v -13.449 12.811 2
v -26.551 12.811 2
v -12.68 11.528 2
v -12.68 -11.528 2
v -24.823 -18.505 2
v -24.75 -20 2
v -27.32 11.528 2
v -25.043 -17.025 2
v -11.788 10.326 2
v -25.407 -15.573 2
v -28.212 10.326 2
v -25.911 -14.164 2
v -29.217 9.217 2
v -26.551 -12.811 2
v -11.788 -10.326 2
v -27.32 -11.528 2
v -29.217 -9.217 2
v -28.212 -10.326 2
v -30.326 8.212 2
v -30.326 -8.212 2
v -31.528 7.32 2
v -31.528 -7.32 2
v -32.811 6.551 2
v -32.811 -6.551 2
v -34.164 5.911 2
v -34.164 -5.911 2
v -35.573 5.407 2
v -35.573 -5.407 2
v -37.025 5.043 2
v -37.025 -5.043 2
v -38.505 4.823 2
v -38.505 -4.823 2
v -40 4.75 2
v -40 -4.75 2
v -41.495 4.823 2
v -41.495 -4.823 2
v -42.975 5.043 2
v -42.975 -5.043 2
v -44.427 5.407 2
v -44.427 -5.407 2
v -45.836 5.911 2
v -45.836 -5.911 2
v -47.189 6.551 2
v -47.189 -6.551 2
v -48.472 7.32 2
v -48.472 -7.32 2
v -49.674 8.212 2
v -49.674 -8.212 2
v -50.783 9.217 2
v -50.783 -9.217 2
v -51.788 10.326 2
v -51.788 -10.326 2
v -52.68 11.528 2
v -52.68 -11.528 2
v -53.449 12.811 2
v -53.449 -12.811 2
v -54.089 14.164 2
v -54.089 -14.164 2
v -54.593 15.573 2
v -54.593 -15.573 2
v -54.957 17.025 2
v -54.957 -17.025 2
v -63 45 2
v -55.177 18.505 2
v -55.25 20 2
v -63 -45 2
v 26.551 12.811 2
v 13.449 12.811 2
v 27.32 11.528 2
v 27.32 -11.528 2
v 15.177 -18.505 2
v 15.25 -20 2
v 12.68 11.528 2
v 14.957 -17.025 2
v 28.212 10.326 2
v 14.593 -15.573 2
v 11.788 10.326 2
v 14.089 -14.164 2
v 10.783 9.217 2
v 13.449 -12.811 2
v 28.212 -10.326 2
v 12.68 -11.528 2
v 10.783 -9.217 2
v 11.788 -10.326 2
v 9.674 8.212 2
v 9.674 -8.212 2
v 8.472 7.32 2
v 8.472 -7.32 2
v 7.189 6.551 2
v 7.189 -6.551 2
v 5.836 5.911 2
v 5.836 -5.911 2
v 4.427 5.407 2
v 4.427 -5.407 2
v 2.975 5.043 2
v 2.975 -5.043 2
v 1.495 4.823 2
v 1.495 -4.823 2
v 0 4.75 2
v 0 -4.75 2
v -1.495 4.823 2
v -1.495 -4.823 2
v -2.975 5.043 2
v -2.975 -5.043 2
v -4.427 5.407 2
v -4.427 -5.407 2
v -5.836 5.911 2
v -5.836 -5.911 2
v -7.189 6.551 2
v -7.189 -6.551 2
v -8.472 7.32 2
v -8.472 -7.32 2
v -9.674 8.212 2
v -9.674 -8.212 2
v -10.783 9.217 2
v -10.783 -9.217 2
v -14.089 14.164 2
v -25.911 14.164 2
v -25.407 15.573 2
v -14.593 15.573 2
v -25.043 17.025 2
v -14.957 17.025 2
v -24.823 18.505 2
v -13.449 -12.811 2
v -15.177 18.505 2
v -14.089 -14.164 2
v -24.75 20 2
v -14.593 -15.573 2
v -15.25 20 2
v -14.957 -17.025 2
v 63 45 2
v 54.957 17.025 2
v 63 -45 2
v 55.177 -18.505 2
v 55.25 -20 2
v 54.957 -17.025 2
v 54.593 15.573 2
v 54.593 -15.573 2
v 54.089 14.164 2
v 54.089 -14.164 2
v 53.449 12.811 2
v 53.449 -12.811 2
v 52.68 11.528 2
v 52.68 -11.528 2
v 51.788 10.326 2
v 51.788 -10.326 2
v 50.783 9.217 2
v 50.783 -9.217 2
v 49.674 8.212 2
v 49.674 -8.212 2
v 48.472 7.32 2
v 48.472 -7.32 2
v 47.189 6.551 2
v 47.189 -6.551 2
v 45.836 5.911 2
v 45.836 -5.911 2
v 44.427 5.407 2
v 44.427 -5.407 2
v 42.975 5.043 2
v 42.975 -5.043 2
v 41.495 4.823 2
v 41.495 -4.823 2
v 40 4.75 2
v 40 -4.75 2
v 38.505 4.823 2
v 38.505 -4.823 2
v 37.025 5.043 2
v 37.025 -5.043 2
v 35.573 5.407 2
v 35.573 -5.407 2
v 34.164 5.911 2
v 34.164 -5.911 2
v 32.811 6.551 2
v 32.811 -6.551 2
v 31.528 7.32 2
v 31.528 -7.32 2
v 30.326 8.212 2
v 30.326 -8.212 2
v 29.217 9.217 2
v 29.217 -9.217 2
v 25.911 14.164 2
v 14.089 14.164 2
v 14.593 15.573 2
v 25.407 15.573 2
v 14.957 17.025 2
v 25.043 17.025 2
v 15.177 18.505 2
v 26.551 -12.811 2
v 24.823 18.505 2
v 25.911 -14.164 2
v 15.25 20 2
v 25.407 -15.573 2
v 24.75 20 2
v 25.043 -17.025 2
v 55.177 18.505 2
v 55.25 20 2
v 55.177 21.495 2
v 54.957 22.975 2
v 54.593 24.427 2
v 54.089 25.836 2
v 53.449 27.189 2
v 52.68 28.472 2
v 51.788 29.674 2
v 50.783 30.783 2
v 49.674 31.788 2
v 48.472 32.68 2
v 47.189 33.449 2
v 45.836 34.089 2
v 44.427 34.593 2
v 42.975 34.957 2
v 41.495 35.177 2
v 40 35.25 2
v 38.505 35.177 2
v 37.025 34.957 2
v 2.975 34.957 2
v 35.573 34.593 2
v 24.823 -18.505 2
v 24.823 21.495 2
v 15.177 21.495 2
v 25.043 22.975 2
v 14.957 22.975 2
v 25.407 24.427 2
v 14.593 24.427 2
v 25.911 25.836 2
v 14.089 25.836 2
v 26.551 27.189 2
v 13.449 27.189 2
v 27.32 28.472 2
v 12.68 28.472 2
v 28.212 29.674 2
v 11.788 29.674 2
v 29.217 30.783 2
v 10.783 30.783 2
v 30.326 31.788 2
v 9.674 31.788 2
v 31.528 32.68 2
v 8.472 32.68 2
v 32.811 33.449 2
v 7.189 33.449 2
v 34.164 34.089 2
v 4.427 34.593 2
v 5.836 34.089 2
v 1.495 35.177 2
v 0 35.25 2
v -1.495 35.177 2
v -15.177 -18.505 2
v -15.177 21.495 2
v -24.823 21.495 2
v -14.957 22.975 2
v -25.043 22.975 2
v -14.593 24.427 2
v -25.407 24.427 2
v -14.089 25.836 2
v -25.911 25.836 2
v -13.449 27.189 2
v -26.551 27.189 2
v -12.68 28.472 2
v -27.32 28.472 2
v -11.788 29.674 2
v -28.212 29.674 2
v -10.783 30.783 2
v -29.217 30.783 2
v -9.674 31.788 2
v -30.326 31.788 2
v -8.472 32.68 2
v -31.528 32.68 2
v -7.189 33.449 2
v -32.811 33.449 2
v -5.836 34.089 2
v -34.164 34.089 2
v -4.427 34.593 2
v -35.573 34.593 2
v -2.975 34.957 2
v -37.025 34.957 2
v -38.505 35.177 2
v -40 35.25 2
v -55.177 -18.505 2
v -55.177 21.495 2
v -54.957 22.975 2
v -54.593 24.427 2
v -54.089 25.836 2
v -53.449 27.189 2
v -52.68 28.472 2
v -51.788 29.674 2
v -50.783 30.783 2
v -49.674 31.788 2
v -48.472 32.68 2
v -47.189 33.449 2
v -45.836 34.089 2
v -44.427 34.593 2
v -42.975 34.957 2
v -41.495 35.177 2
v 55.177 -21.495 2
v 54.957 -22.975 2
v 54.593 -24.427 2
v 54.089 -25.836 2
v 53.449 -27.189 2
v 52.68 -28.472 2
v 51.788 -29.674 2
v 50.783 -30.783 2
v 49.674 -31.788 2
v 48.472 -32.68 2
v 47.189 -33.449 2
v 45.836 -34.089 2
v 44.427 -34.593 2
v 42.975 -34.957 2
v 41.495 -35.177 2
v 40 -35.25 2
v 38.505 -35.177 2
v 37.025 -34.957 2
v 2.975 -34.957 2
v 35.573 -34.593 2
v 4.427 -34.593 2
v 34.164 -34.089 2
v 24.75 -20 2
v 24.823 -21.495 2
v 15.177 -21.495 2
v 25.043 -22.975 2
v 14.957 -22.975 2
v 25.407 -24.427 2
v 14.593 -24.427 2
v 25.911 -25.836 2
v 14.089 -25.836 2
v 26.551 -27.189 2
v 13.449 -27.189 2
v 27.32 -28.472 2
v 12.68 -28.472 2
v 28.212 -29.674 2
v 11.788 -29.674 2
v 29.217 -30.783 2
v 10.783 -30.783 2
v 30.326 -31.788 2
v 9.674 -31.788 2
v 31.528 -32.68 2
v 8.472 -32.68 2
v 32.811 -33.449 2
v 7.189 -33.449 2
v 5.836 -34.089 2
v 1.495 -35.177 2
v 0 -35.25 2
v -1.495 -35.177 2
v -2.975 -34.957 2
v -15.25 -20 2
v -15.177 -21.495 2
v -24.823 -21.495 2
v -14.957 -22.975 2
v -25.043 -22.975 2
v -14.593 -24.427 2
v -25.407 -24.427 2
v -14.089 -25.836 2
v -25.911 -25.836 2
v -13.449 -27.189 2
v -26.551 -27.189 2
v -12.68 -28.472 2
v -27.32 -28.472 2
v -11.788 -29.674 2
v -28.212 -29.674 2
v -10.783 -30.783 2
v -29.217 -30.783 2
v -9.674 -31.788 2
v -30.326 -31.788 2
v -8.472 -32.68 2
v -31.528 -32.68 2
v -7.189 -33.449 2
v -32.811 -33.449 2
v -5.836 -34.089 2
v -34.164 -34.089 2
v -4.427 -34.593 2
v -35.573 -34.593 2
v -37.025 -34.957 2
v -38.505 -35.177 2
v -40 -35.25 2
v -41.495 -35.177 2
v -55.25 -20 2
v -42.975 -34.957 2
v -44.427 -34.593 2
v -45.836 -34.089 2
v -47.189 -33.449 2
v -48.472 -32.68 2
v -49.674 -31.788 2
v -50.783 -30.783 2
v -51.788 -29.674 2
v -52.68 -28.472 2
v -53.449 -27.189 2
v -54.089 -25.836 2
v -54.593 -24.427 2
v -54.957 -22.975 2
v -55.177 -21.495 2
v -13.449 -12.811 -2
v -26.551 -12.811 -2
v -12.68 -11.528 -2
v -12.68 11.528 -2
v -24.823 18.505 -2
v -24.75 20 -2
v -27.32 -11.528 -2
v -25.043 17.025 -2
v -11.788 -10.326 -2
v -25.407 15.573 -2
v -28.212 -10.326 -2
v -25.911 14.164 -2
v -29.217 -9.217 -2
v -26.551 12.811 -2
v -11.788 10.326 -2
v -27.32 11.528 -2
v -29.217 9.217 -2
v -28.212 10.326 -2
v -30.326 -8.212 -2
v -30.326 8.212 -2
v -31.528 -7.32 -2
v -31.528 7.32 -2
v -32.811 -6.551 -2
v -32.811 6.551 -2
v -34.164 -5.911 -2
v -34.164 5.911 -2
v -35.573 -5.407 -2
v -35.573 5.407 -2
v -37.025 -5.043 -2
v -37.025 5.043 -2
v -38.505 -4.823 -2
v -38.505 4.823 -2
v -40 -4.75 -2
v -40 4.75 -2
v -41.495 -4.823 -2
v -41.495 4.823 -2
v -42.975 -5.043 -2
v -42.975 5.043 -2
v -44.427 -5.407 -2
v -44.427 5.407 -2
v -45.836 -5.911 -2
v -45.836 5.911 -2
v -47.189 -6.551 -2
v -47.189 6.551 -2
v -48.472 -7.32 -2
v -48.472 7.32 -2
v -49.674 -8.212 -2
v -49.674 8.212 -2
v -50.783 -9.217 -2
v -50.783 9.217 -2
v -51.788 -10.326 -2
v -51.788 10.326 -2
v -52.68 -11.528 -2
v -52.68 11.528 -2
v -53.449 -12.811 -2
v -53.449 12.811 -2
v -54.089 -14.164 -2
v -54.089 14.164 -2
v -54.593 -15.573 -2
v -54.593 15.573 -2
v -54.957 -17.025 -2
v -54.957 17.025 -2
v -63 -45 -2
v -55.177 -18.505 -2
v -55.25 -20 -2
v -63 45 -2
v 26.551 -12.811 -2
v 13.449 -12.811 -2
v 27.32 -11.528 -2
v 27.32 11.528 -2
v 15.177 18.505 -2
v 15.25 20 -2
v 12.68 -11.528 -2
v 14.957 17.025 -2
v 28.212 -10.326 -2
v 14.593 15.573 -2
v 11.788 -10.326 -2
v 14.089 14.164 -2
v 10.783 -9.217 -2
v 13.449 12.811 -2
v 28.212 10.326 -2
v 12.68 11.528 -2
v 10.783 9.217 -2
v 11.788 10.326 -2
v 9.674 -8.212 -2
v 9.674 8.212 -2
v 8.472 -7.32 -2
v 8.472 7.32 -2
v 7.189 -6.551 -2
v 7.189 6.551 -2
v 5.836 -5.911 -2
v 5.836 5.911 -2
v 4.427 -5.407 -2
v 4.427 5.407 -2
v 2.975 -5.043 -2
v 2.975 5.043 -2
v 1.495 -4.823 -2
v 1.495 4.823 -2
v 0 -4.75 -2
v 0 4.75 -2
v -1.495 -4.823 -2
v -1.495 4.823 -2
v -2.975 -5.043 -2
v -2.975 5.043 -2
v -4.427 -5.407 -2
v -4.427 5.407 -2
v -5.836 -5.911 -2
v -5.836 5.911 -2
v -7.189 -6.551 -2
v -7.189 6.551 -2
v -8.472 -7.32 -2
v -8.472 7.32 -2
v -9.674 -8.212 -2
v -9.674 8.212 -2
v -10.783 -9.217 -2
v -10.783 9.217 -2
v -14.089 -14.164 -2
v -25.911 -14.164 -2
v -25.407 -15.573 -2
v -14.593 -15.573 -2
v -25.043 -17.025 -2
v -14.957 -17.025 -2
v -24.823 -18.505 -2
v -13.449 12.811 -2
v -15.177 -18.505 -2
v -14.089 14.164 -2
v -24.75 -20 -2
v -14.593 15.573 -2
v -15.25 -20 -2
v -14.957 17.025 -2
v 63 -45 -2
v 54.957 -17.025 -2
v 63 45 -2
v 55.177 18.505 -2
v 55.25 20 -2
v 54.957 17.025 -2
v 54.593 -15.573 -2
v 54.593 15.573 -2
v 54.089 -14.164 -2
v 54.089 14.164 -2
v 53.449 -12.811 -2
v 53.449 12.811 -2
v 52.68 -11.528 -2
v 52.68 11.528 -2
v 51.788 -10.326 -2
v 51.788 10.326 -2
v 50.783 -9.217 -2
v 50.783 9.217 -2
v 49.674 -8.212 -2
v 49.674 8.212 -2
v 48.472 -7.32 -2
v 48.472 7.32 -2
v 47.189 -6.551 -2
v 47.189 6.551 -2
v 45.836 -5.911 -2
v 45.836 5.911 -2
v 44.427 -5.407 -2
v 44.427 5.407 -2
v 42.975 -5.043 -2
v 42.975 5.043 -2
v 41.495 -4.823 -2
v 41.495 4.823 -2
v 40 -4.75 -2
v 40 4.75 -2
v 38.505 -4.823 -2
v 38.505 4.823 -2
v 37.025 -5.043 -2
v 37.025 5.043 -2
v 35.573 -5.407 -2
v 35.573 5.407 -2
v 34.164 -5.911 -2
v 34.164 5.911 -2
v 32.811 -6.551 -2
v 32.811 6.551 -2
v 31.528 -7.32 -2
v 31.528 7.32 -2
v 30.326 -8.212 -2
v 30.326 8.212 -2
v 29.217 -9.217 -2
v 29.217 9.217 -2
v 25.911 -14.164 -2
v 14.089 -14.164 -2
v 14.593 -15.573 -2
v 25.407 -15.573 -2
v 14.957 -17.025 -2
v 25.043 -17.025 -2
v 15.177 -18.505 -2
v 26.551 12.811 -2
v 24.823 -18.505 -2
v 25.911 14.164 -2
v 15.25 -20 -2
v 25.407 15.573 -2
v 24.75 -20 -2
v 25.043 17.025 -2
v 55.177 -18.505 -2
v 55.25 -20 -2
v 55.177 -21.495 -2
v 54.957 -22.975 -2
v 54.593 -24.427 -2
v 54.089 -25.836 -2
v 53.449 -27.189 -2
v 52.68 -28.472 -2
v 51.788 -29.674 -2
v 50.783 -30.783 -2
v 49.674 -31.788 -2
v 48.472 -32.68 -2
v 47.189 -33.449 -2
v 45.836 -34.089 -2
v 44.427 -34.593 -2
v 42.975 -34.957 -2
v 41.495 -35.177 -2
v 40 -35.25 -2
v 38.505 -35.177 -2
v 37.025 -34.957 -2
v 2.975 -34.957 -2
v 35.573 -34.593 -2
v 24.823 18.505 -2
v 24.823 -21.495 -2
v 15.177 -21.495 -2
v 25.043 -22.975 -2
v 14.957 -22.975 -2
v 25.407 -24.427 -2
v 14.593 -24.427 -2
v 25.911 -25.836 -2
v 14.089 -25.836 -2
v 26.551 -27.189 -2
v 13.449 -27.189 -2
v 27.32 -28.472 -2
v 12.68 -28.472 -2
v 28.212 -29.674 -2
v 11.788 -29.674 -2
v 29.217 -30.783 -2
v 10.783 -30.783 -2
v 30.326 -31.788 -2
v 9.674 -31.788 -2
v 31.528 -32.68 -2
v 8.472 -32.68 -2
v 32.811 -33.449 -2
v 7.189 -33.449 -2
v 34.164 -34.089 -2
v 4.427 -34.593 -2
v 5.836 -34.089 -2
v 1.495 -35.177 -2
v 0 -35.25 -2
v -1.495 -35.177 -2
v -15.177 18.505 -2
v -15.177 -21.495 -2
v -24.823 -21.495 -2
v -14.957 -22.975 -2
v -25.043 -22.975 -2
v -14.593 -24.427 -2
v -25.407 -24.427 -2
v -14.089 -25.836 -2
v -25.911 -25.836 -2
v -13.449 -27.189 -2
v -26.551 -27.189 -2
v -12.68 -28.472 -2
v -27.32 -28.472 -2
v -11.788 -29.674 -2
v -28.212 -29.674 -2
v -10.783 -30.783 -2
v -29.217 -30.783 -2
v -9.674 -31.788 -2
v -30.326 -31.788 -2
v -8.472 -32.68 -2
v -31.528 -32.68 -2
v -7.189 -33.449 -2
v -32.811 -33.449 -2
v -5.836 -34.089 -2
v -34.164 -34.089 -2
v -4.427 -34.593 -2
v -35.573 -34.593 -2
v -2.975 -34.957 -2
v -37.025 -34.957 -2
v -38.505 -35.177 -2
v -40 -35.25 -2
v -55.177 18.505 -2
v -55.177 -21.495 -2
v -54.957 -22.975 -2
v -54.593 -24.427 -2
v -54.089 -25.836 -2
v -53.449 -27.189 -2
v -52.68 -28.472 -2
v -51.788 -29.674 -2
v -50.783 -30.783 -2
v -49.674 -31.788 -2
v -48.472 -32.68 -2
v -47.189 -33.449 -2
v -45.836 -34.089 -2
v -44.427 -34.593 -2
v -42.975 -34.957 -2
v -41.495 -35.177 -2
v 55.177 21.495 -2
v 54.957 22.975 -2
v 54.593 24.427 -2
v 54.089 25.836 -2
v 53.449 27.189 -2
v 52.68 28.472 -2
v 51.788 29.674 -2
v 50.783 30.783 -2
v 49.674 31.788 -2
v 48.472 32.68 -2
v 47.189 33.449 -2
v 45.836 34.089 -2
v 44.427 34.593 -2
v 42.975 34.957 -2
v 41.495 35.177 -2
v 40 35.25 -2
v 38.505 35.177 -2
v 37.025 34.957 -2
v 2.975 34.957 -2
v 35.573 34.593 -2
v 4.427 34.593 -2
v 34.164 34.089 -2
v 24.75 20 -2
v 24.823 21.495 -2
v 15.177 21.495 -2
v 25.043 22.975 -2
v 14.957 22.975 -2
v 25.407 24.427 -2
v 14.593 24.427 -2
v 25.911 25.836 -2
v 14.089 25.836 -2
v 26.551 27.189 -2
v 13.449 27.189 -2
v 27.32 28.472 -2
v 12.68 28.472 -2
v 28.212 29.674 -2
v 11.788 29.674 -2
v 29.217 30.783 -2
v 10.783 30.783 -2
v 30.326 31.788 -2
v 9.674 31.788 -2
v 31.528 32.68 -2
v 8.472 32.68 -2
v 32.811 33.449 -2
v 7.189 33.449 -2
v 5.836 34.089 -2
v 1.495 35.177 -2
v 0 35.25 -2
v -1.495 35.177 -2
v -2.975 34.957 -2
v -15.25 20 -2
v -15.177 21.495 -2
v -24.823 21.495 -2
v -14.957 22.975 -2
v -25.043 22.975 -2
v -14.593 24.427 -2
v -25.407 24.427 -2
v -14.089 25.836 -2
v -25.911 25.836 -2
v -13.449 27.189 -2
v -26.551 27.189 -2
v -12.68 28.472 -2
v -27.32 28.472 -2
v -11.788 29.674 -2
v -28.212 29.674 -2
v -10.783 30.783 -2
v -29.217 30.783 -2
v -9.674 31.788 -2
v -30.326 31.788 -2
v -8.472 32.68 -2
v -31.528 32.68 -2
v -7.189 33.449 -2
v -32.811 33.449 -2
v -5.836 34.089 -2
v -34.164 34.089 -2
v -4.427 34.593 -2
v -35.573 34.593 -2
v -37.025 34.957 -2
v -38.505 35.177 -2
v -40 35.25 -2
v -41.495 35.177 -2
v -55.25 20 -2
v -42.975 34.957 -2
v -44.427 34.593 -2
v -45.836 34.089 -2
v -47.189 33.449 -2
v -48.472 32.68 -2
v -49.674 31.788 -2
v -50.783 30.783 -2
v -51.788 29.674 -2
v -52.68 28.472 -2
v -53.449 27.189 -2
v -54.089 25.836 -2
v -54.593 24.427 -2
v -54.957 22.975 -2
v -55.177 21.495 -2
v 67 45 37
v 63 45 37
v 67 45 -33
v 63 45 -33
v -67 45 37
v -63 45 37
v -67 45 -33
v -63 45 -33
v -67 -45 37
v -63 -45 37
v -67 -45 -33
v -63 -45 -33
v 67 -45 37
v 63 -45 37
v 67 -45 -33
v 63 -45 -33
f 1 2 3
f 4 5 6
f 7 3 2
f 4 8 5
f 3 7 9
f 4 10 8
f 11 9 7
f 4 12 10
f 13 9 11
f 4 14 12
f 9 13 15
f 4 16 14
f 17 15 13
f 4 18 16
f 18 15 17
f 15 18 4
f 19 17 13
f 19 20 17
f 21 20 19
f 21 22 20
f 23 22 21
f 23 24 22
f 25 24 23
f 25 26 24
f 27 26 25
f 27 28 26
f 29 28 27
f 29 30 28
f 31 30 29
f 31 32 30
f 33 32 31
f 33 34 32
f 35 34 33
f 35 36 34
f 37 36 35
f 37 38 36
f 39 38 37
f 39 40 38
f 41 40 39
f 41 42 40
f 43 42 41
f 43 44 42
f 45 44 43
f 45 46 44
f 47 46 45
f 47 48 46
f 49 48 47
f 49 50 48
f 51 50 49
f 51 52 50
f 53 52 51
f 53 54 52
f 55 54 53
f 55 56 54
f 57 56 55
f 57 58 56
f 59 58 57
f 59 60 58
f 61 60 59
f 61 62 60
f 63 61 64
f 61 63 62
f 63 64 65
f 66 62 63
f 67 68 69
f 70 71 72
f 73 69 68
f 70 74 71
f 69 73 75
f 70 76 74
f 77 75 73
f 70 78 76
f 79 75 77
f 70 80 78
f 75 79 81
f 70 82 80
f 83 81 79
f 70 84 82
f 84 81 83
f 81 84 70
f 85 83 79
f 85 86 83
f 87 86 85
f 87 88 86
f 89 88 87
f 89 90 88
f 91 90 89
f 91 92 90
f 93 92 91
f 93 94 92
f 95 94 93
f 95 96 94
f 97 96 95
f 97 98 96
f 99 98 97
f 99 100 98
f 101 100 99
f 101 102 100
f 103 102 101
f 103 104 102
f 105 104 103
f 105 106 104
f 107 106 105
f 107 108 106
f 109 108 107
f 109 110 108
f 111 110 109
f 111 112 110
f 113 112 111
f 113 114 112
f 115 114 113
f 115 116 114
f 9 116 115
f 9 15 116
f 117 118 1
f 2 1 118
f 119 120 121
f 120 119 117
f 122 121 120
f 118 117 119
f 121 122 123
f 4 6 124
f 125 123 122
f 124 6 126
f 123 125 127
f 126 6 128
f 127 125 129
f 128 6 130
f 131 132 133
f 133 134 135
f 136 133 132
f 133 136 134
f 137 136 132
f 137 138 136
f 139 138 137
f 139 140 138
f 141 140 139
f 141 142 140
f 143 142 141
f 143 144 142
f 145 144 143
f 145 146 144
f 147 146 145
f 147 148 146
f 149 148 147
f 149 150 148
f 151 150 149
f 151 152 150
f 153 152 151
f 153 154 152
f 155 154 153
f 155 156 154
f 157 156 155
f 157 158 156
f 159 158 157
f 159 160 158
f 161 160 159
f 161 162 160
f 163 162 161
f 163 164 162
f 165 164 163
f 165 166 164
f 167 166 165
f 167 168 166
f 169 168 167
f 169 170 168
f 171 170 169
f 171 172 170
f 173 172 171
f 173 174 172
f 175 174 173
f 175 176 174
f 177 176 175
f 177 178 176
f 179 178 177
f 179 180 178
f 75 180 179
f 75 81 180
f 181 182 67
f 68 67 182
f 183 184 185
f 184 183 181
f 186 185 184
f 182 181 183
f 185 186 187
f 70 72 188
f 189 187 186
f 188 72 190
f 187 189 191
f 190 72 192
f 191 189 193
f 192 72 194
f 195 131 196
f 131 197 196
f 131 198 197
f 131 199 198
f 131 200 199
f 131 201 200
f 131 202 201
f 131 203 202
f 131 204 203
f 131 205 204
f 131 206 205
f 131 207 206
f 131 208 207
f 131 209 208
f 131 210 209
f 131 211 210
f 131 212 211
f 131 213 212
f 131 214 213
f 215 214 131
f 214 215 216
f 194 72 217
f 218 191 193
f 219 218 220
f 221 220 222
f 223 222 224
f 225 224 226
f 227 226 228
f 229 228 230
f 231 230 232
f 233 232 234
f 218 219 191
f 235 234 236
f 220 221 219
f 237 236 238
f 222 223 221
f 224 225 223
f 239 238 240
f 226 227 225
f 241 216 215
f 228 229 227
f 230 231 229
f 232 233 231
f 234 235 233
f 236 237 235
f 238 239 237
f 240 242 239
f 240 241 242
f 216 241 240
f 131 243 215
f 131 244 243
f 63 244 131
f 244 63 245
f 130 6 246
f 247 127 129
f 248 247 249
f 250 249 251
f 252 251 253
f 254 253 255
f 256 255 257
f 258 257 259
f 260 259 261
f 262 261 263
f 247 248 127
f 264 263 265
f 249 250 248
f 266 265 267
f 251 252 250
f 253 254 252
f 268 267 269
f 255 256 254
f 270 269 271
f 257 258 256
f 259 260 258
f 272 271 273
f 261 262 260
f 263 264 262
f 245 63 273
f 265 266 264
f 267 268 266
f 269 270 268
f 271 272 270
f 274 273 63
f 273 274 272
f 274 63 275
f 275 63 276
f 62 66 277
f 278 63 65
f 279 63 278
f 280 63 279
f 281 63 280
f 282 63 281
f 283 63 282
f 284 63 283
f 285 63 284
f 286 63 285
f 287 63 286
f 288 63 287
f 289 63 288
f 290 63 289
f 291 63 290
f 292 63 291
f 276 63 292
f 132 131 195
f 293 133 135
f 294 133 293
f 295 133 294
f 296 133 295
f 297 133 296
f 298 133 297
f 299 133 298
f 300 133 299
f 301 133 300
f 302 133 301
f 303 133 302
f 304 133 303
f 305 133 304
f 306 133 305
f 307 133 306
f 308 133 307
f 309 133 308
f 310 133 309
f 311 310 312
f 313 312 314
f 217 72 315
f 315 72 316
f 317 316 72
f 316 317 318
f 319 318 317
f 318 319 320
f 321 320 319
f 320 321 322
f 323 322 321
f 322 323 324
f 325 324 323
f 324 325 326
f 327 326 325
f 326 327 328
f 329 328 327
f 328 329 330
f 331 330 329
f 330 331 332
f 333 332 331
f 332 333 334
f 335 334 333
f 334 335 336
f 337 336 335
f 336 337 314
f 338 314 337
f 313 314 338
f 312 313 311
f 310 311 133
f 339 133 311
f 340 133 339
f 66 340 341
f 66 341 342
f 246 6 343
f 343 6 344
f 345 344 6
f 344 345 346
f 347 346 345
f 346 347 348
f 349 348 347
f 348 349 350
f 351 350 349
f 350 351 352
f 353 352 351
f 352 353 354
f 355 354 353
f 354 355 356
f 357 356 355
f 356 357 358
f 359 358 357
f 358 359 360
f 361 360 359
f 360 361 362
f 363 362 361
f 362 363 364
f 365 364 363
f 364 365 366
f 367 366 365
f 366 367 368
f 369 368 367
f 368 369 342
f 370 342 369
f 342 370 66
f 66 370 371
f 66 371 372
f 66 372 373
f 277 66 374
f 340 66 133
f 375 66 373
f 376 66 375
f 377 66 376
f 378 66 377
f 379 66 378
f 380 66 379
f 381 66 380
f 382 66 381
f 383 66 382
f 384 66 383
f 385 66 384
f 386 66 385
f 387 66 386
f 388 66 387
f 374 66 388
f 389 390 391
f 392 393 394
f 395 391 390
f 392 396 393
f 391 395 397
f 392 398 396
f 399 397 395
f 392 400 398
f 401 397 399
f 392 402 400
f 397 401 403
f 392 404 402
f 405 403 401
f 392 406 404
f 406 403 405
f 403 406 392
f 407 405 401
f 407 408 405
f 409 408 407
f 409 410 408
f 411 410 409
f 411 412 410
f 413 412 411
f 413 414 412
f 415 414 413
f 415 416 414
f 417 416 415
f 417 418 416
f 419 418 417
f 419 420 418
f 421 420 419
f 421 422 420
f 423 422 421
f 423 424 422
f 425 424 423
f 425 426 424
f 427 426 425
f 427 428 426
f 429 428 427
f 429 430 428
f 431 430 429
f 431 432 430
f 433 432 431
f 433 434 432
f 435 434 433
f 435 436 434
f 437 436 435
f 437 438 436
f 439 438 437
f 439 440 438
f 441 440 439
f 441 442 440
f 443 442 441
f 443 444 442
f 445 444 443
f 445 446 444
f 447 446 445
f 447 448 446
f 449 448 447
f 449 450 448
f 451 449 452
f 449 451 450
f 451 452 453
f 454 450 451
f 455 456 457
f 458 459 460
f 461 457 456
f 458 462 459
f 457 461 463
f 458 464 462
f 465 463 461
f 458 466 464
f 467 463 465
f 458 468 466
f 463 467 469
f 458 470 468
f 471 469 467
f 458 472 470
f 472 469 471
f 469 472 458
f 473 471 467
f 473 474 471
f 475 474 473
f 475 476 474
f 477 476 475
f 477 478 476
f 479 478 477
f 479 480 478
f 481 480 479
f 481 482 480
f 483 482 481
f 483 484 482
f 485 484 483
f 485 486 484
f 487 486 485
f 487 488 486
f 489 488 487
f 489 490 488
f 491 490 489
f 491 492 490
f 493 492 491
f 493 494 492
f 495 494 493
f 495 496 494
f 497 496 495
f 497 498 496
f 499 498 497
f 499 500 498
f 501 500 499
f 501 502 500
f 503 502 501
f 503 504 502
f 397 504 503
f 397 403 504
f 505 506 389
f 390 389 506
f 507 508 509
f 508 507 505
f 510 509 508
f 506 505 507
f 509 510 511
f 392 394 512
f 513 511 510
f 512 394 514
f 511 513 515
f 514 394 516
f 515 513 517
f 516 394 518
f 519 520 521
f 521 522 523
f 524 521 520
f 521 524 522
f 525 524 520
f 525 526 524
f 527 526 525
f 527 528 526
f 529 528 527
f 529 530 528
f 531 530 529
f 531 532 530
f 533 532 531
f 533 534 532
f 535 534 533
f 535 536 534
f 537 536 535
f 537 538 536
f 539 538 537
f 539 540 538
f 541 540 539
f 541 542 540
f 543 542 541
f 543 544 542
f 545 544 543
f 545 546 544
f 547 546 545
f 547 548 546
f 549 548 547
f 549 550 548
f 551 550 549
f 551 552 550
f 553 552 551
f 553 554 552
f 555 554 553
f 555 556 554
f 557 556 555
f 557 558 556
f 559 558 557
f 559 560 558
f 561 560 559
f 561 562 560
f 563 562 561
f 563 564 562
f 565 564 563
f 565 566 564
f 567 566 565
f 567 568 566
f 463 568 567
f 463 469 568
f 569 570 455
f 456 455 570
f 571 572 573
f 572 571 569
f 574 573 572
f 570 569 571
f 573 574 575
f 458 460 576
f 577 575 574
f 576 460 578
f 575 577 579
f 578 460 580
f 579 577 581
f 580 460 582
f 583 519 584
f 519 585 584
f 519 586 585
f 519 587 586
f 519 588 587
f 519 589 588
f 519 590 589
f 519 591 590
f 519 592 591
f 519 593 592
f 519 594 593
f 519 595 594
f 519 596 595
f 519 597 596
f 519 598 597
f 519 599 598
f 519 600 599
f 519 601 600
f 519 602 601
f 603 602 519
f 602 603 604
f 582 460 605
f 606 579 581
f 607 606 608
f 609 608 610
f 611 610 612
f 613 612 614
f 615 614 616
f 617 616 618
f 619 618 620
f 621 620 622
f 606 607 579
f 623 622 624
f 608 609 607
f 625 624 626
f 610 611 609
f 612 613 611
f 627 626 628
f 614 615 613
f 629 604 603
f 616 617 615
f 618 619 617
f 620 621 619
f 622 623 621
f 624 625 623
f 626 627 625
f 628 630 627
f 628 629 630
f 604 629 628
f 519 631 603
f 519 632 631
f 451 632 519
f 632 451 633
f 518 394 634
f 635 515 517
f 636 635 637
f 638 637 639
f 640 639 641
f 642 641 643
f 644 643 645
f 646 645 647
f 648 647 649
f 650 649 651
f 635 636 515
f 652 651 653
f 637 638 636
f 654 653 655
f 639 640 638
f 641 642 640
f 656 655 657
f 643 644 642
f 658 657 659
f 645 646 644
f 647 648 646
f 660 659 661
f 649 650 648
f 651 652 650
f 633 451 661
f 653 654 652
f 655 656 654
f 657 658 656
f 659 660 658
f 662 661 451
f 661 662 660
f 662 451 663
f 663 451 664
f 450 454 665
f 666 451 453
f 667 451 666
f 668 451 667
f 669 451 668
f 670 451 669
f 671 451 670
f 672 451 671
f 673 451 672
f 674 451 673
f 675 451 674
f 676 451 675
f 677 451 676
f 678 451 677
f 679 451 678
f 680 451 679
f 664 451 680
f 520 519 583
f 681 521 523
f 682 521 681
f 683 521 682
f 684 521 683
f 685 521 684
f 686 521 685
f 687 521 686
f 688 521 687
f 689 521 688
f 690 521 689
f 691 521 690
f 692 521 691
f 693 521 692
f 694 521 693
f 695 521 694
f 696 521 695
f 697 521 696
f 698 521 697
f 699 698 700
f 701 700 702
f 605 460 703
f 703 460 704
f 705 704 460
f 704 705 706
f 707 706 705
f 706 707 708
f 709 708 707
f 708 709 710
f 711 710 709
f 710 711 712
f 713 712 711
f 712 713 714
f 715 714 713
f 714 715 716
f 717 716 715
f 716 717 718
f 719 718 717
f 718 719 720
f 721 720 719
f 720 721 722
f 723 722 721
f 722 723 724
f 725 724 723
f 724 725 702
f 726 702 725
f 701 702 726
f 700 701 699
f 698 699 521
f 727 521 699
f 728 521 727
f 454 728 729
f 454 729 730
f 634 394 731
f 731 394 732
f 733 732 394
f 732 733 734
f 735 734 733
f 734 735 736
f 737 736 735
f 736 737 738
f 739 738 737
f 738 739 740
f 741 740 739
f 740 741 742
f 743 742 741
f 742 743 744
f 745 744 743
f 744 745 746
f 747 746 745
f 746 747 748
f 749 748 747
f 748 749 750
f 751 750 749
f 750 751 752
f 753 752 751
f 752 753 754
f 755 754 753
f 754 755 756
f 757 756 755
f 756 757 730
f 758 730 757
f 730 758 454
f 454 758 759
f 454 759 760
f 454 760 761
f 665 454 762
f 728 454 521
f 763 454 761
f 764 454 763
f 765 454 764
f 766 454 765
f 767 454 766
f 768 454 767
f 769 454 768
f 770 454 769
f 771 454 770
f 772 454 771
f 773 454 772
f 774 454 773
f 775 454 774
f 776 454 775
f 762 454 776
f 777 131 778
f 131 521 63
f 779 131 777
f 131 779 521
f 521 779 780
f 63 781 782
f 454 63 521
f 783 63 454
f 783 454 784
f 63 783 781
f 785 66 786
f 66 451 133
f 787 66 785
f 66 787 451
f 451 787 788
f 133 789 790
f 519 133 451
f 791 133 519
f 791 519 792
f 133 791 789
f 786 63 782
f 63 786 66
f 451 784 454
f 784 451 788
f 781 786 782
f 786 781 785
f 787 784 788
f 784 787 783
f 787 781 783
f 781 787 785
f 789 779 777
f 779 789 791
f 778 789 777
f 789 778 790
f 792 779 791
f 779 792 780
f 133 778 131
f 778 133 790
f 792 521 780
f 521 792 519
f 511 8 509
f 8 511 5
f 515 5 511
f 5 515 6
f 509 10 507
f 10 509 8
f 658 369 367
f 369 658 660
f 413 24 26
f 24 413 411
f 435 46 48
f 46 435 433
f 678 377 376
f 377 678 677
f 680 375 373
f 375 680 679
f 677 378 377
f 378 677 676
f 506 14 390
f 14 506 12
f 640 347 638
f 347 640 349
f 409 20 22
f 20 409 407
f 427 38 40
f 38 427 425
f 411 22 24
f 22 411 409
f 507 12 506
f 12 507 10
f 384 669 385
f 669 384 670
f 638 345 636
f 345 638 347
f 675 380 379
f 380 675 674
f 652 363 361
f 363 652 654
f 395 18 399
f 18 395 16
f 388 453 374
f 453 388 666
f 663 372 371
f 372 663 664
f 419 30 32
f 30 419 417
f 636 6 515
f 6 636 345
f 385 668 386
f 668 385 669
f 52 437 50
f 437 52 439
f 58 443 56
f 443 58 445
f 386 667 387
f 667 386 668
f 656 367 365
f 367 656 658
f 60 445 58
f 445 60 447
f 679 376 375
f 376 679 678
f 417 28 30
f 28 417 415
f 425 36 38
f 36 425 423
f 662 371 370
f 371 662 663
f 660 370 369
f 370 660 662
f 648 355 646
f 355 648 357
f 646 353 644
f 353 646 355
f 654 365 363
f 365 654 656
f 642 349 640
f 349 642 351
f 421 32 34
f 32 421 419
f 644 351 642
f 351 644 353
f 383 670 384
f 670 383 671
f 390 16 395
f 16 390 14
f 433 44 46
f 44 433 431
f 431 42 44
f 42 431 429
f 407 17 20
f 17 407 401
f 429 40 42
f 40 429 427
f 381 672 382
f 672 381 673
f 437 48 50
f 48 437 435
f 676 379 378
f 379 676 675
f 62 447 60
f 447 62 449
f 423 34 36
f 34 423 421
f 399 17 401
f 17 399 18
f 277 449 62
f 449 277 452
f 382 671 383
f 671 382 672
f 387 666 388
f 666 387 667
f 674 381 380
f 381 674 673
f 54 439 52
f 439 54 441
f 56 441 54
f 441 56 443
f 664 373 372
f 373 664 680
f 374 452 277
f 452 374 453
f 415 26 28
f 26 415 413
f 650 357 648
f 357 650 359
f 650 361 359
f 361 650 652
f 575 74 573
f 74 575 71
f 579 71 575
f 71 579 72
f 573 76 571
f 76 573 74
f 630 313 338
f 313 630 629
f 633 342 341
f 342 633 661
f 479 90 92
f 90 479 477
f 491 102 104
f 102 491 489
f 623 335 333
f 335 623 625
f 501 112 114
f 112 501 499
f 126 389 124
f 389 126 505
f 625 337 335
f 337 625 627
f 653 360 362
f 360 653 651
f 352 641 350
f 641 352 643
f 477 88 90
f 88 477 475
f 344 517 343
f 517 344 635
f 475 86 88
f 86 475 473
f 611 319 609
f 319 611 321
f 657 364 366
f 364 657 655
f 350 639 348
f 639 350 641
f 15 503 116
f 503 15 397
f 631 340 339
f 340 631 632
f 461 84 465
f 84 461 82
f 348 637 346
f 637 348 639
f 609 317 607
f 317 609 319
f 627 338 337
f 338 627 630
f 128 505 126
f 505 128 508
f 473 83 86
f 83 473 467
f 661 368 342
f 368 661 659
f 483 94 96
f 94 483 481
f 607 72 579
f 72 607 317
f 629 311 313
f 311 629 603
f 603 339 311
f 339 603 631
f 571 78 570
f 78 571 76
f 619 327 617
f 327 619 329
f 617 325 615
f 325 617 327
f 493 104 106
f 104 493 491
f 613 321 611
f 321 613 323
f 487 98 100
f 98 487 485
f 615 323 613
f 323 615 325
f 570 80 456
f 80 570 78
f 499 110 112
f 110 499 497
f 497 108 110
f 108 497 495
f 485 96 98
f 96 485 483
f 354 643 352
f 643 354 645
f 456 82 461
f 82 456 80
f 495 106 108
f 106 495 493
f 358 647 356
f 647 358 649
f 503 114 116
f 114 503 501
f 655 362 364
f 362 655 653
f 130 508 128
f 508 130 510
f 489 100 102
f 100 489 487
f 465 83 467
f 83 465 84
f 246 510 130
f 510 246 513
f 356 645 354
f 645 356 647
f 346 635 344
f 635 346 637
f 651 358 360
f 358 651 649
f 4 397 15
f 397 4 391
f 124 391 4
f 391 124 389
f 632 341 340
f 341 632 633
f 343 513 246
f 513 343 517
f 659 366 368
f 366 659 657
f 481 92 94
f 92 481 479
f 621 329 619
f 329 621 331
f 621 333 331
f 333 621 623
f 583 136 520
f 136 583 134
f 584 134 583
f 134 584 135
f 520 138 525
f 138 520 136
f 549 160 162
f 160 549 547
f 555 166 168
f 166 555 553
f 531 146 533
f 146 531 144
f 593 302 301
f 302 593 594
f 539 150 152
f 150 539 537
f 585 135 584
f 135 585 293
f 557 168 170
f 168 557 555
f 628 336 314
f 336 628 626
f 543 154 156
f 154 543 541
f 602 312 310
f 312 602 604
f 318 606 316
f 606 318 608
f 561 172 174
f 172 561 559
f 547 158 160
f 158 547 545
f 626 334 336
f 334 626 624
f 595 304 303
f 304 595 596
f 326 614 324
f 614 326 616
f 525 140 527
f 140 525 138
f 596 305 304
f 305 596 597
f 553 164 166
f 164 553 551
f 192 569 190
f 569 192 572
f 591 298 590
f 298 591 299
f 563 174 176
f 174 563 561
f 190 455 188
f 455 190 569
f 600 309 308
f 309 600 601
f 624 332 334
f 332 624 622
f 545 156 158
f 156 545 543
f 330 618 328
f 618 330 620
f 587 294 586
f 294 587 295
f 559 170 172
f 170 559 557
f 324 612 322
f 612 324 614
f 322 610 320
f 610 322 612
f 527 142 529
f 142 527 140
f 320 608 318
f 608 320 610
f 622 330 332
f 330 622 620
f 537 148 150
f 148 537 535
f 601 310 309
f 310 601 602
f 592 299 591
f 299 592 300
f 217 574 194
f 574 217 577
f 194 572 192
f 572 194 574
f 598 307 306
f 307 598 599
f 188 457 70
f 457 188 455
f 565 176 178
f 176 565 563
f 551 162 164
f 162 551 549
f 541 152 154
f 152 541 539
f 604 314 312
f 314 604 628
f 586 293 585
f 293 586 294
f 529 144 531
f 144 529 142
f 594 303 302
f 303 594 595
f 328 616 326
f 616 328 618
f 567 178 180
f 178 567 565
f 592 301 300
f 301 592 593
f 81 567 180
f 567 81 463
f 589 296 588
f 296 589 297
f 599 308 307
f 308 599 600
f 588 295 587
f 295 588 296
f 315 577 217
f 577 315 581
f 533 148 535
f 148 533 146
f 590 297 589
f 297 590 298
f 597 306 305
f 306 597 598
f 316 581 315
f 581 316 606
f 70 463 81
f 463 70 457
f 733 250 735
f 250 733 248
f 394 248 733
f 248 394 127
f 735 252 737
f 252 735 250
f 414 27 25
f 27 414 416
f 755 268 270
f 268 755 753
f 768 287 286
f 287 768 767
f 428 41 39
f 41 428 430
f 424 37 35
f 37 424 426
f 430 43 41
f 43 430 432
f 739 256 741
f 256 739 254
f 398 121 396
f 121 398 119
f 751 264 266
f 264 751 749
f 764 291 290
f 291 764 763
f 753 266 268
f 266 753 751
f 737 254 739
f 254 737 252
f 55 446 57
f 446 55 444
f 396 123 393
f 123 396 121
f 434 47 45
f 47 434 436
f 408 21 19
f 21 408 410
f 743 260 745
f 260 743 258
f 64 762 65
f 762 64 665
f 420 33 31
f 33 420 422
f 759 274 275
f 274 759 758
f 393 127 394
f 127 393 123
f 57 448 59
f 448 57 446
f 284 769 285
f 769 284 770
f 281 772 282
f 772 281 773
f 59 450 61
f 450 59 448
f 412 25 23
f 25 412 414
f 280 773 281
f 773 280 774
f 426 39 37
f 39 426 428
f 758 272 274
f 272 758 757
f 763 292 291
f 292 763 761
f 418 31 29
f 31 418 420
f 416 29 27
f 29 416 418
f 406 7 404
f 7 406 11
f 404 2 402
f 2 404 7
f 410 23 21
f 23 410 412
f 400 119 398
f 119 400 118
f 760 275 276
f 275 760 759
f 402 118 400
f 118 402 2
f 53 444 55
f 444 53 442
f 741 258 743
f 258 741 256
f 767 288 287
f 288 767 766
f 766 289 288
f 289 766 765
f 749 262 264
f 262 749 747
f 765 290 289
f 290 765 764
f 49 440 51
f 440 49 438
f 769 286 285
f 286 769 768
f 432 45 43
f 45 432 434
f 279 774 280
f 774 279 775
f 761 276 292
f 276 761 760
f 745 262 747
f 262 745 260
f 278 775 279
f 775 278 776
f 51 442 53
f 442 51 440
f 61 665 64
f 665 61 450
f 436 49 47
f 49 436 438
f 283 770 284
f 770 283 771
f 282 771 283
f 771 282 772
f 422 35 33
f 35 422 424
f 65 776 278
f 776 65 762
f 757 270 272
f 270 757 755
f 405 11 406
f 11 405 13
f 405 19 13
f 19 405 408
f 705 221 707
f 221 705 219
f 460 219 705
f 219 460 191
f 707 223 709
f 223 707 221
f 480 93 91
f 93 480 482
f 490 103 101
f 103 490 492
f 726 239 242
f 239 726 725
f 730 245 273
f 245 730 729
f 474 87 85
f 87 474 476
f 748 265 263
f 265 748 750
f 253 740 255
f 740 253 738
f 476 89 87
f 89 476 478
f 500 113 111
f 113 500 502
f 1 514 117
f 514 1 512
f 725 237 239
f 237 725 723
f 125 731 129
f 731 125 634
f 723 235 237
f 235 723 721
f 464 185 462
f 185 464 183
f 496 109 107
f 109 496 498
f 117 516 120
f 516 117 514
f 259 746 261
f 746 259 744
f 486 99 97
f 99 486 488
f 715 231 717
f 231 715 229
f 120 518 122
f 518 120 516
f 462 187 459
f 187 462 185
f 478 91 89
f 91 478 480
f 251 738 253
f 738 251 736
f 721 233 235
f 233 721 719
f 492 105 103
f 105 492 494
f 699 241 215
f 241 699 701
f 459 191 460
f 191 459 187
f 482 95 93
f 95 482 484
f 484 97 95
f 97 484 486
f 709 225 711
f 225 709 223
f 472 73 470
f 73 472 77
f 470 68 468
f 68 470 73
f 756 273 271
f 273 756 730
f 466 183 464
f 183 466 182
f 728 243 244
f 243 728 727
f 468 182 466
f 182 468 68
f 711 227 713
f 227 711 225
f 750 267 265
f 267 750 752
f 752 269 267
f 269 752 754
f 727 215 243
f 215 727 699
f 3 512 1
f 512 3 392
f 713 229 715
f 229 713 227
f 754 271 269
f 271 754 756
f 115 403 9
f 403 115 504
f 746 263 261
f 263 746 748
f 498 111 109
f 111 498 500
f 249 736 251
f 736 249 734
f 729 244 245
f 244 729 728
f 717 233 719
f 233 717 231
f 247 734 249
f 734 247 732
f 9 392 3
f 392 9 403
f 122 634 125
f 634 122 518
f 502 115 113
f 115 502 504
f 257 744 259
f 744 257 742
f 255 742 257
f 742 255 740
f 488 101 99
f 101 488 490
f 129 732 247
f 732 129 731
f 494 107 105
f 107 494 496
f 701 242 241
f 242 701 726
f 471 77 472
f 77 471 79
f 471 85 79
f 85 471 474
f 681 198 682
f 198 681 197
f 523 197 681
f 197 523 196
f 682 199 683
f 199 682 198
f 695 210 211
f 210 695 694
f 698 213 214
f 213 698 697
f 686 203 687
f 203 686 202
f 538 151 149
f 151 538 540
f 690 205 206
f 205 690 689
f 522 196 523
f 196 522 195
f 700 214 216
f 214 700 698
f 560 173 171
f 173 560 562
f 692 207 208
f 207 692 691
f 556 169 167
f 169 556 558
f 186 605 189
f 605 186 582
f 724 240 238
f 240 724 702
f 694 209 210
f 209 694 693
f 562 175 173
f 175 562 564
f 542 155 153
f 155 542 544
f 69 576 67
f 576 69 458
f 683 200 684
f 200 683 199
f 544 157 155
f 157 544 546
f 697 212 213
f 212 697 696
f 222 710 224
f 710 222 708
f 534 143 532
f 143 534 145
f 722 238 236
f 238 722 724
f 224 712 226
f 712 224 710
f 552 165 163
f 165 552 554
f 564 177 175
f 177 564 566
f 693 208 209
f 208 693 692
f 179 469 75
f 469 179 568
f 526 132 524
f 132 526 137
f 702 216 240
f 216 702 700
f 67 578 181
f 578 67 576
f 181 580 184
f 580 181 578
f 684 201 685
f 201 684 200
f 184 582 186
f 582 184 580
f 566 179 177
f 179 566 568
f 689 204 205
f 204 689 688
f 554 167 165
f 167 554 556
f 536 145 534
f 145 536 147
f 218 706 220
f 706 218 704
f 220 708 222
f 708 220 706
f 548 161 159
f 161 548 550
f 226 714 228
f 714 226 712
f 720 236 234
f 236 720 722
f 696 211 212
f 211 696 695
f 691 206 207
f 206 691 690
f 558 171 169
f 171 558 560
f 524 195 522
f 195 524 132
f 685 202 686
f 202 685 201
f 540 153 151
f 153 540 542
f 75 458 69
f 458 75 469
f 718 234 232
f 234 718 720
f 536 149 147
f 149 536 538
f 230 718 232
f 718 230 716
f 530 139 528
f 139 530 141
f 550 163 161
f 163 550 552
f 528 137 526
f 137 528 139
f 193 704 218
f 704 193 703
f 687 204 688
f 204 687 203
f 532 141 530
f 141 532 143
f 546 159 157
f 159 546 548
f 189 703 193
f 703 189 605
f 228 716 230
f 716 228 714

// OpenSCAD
// Dimensions for 50 mL Falcon Tubes Rack
// Units: mm

// Plate Dimensions
plate_x = 130;
plate_y = 90;
plate_z = 4;

// Hole Dimensions
hole_diameter = 30.5;
hole_spacing_x = 40;
hole_spacing_y = 40;

// Wall Dimensions
wall_thickness = 4;
wall_height = 70;

// Derived Positions
hole_offset_x = hole_spacing_x / 2;
hole_offset_y = hole_spacing_y / 2;

// Render
$fn = 64;

// Main Body
module rack_body() {
    union() {
        // Base Plate
        cube([plate_x, plate_y, plate_z], center=true);
        
        // Walls
        // Left Wall
        translate([-plate_x/2, 0, plate_z/2])
            cube([plate_z, plate_y, wall_height], center=true);
            
        // Right Wall
        translate([plate_x/2, 0, plate_z/2])
            cube([plate_z, plate_y, wall_height], center=true);
    }
}

// Cutouts
module cutouts() {
    // Calculate grid positions
    // Row 1 (y = -40)
    translate([0, -hole_offset_y, 0])
        for (i = [-1, 0, 1]) {
            translate([i * hole_spacing_x, 0, 0])
                cylinder(d = hole_diameter, h = plate_z + 1, center=true);
        }
    
    // Row 2 (y = +40)
    translate([0, hole_offset_y, 0])
        for (i = [-1, 0, 1]) {
            translate([i * hole_spacing_x, 0, 0])
                cylinder(d = hole_diameter, h = plate_z + 1, center=true);
        }
}

// Assembly
difference() {
    rack_body();
    cutouts();
}
